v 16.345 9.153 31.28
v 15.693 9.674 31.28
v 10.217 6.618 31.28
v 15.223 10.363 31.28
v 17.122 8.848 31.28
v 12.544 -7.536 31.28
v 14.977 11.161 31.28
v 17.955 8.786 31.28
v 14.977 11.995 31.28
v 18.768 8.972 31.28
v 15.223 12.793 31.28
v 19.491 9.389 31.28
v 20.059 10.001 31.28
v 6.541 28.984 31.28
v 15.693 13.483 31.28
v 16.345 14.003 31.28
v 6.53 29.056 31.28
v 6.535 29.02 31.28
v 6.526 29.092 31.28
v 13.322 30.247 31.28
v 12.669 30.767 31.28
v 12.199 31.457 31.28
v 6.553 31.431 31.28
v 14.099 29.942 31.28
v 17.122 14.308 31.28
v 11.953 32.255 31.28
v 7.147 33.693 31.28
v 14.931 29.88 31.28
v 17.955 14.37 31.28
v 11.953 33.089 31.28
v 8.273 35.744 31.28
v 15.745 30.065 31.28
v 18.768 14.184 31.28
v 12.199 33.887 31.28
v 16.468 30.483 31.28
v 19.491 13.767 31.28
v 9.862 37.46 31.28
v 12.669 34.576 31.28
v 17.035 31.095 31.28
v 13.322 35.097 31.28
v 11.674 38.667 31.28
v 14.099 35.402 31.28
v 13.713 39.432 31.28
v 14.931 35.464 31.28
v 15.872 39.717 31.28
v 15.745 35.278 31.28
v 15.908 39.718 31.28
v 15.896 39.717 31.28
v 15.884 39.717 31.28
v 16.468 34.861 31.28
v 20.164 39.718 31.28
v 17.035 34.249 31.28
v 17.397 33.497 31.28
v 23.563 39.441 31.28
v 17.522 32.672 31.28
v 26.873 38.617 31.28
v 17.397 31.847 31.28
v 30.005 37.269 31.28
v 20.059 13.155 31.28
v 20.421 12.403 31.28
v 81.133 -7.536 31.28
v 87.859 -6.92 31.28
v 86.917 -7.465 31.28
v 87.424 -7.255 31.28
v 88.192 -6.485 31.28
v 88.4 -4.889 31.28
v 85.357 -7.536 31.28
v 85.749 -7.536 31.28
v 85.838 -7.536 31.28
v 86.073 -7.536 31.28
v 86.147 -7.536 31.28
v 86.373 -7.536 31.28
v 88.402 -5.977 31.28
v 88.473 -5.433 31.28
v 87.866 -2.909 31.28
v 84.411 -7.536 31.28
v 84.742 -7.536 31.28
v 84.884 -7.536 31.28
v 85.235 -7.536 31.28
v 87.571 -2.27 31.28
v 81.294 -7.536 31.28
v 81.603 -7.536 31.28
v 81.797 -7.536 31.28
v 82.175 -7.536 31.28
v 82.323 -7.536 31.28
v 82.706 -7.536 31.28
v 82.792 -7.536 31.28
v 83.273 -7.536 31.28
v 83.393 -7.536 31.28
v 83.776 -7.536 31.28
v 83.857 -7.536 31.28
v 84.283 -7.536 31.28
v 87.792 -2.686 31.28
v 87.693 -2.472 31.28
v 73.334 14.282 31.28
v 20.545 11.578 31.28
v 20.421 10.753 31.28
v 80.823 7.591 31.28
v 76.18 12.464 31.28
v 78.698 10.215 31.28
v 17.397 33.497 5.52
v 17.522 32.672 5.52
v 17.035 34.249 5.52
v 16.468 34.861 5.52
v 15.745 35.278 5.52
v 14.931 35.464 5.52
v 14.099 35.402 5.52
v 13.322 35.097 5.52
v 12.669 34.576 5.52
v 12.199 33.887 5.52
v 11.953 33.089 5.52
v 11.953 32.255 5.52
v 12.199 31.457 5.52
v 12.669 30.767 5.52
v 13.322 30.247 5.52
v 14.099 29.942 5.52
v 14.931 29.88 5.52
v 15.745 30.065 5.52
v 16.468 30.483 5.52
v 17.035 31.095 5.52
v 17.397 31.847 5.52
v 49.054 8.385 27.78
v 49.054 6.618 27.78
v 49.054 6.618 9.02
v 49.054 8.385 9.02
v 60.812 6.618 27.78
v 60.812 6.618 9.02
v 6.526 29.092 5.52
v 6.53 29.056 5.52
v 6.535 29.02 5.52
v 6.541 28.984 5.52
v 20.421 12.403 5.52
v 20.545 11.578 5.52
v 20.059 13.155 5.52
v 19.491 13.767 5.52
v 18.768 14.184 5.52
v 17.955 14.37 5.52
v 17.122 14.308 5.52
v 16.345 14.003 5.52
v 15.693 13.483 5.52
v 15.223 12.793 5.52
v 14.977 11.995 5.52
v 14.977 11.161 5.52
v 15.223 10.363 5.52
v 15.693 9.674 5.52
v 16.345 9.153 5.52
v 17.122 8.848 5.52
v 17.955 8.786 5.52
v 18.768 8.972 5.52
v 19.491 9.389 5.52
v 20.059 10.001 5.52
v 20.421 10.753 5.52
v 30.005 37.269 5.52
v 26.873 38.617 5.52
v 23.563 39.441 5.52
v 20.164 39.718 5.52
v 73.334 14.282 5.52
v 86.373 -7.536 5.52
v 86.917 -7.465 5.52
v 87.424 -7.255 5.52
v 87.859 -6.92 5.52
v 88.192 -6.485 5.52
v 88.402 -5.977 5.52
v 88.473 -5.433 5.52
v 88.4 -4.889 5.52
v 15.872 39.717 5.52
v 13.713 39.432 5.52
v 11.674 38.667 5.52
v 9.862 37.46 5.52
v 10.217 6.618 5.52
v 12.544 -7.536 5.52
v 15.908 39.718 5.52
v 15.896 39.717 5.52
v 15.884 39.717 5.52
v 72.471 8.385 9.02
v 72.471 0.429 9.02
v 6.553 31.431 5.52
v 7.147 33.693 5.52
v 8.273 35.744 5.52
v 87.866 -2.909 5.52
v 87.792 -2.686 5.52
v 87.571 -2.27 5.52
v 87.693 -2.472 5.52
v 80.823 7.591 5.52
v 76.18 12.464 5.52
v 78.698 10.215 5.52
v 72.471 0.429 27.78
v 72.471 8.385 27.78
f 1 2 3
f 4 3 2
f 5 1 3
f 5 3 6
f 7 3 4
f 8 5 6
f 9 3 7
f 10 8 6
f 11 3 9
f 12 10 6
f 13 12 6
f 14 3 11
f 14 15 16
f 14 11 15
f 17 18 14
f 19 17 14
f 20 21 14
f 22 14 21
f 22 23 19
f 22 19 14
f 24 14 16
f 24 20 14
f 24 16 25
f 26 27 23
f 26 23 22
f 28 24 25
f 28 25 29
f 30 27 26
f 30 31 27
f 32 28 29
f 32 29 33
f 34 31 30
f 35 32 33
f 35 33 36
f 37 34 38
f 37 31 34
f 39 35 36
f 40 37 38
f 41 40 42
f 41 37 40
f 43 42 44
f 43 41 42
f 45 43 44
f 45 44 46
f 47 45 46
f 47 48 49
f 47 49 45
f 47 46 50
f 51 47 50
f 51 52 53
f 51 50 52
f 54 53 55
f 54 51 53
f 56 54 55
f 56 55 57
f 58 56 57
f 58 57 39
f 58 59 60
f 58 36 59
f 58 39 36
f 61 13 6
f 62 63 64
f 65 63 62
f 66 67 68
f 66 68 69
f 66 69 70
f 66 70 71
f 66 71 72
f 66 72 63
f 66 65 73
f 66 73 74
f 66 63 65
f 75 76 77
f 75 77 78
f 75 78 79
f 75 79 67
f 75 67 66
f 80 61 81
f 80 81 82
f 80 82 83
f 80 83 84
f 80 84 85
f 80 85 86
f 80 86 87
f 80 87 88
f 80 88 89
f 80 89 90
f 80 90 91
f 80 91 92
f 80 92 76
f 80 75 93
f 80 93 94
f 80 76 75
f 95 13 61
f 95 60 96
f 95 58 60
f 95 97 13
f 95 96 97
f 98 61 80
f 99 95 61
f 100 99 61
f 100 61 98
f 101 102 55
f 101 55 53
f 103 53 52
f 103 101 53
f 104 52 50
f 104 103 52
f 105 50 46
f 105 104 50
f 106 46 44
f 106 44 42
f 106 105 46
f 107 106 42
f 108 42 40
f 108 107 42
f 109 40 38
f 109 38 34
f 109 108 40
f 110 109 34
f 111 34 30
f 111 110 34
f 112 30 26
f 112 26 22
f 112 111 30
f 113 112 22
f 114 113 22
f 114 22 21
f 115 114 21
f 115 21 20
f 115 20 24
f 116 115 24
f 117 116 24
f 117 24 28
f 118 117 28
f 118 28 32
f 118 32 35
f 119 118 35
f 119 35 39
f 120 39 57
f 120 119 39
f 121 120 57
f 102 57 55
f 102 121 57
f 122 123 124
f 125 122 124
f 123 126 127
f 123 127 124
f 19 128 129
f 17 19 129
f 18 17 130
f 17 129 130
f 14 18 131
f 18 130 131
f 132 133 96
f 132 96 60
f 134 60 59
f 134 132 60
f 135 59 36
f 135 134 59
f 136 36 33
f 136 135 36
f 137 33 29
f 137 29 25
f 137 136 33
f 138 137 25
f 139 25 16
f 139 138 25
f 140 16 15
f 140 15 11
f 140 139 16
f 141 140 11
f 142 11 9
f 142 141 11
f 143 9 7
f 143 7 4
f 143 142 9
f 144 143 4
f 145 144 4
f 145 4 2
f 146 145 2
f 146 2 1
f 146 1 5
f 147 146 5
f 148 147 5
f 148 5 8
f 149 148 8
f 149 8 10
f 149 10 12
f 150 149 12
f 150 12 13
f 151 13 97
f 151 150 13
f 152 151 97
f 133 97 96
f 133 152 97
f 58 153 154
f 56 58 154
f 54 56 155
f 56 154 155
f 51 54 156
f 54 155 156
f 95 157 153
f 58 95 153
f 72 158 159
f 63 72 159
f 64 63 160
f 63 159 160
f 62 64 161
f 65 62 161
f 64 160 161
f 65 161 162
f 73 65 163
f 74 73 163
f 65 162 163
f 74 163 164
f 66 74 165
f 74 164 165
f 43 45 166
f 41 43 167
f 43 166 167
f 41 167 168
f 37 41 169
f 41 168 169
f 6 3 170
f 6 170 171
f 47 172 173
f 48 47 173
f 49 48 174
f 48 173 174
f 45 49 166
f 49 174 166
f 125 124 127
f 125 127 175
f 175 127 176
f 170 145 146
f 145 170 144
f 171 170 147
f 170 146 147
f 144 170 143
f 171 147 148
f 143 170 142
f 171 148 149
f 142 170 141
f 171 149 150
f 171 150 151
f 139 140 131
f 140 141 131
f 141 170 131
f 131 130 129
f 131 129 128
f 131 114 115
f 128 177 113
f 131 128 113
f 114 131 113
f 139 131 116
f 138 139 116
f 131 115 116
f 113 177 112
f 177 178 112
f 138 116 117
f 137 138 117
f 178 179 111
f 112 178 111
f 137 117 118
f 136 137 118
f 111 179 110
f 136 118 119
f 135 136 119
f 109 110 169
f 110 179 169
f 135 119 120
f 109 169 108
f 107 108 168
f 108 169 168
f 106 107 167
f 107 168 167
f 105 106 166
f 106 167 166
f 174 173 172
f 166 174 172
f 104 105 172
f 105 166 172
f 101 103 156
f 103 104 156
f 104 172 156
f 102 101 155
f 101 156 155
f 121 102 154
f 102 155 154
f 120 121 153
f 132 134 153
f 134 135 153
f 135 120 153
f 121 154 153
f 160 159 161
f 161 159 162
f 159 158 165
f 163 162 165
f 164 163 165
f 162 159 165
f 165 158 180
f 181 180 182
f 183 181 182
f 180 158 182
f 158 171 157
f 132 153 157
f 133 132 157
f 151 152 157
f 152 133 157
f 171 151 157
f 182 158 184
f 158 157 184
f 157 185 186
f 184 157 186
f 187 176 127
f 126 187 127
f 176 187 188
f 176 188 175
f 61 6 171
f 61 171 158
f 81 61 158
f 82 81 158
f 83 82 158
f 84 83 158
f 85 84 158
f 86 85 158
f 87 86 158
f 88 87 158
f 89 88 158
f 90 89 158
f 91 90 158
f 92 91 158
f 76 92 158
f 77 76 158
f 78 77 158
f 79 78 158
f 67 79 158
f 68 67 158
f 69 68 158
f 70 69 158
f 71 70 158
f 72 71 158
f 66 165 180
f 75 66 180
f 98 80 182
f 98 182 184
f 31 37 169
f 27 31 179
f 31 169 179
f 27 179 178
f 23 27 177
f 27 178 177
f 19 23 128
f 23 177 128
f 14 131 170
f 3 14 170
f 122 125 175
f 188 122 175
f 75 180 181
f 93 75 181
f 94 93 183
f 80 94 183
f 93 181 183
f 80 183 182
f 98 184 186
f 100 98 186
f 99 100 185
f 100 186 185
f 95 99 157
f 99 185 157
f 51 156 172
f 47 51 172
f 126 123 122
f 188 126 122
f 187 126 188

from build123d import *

# Parameters (mm, degrees)
SKETCH1_R           = 4
SKETCH1_W           = 0.443674292
SKETCH1_H           = 0.606573965
SKETCH1_W_2         = 0.441272096
SKETCH1_W_3         = 0.539332563
SKETCH1_W_4         = 0.547504268
SKETCH1_W_5         = 0.686423262
SKETCH1_W_6         = 0.547504269
SKETCH1_W_7         = 0.607984695
SKETCH1_W_8         = 0.472854348
SKETCH1_W_9         = 0.501804613
SKETCH1_W_10        = 0.559705146
SKETCH1_W_11        = 0.321886919
SKETCH1_W_12        = 0.335329484
BOSS_EXTRUDE1_DEPTH = 36.8
SKETCH2_W           = 33.453118401
SKETCH2_H           = 26.8
CUT_EXTRUDE1_DEPTH  = 45
SCALE1_SCALE        = 0.7
BOSS_EXTRUDE2_DEPTH = 25.76


with BuildPart() as part:
    # Sketch1 → Boss-Extrude1 (new body)
    # profile 1 of 15: a face of its own
    with BuildSketch(Plane.XY):
        with BuildLine():
            ThreePointArc((-2.487228681, 2.47588145), (-1.643417841, 0.836304882), (0, 0))
            Line((0, 0), (42.98, -6.863043607))
            ThreePointArc((42.98, -6.863043607), (45.517837276, -6.94186018), (47.993719609, -6.378977628))
            ThreePointArc((47.993719609, -6.378977628), (70.945368499, -4.618817082), (91.44683801, -15.086199743))
            ThreePointArc((91.44683801, -15.086199743), (93.970071754, -16.788756754), (96.888617808, -17.653336321))
            Line((96.888617808, -17.653336321), (96.888617808, -17.138033163))
            Line((96.888617808, -17.138033163), (97.372163904, -17.138033163))
            Line((97.372163904, -17.138033163), (97.653484824, -17.138033163))
            Line((97.653484824, -17.138033163), (98.160101984, -17.138033163))
            Line((98.160101984, -17.138033163), (98.378364418, -17.138033163))
            Line((98.378364418, -17.138033163), (98.82203871, -17.138033163))
            Line((98.82203871, -17.138033163), (99.050846464, -17.138033163))
            Line((99.050846464, -17.138033163), (99.49211856, -17.138033163))
            Line((99.49211856, -17.138033163), (99.769956547, -17.138033163))
            Line((99.769956547, -17.138033163), (100.30928911, -17.138033163))
            Line((100.30928911, -17.138033163), (100.521753453, -17.138033163))
            Line((100.521753453, -17.138033163), (101.069257721, -17.138033163))
            Line((101.069257721, -17.138033163), (101.191833303, -17.138033163))
            Line((101.191833303, -17.138033163), (101.878256565, -17.138033163))
            Line((101.878256565, -17.138033163), (102.04986238, -17.138033163))
            Line((102.04986238, -17.138033163), (102.597366649, -17.138033163))
            Line((102.597366649, -17.138033163), (102.713161539, -17.138033163))
            Line((102.713161539, -17.138033163), (103.321146234, -17.138033163))
            Line((103.321146234, -17.138033163), (103.504651325, -17.138033163))
            Line((103.504651325, -17.138033163), (103.977505673, -17.138033163))
            Line((103.977505673, -17.138033163), (104.180157536, -17.138033163))
            Line((104.180157536, -17.138033163), (104.681962149, -17.138033163))
            Line((104.681962149, -17.138033163), (104.855663746, -17.138033163))
            Line((104.855663746, -17.138033163), (105.415368892, -17.138033163))
            Line((105.415368892, -17.138033163), (105.543243667, -17.138033163))
            Line((105.543243667, -17.138033163), (105.878573151, -17.138033163))
            Line((105.878573151, -17.138033163), (105.984724127, -17.138033163))
            Line((105.984724127, -17.138033163), (106.306611046, -17.138033163))
            Line((106.306611046, -17.138033163), (106.306611046, -17.744607128))
            ThreePointArc((106.306611046, -17.744607128), (108.688292645, -16.568776189), (109.203004303, -13.963002303))
            Line((109.203004303, -13.963002303), (108.439636924, -11.134191555))
            ThreePointArc((108.439636924, -11.134191555), (108.267803288, -10.660099415), (108.018988687, -10.221486316))
            Line((108.018988687, -10.221486316), (98.378364418, 3.865502848))
            ThreePointArc((98.378364418, 3.865502848), (93.609207326, 9.293547423), (87.68053985, 13.423853614))
            Line((87.68053985, 13.423853614), (25.781983162, 46.262452549))
            ThreePointArc((25.781983162, 46.262452549), (18.966543391, 48.873228311), (11.72235753, 49.761001134))
            Line((11.72235753, 49.761001134), (5.64235753, 49.761001134))
            ThreePointArc((5.64235753, 49.761001134), (5.616565931, 49.760890264), (5.590776238, 49.760557663))
            ThreePointArc((5.590776238, 49.760557663), (1.019670875, 48.889839007), (-2.994529703, 46.536256857))
            ThreePointArc((-2.994529703, 46.536256857), (-6.872179638, 41.155169878), (-7.760495561, 34.582258733))
            ThreePointArc((-7.760495561, 34.582258733), (-7.750828994, 34.504551611), (-7.739137581, 34.427123255))
            Line((-7.739137581, 34.427123255), (-2.487228681, 2.47588145))
        make_face()
        with Locations((8.267526818, 9.561727541)):
            Circle(SKETCH1_R, mode=Mode.SUBTRACT)
        with Locations((3.948380067, 39.69588145)):
            Circle(SKETCH1_R, mode=Mode.SUBTRACT)
    # profile 2 of 15: a face of its own
    with BuildSketch(Plane.XY):
        with BuildLine():
            Line((96.888617808, -17.138033163), (96.888617808, -17.653336321))
            ThreePointArc((96.888617808, -17.653336321), (97.130063387, -17.683196177), (97.372163904, -17.707173622))
            Line((97.372163904, -17.707173622), (97.372163904, -17.138033163))
            Line((97.372163904, -17.138033163), (96.888617808, -17.138033163))
        make_face()
    # profile 3 of 15: a face of its own
    with BuildSketch(Plane.XY):
        with BuildLine():
            Line((97.653484824, -17.138033163), (97.653484824, -17.727590841))
            ThreePointArc((97.653484824, -17.727590841), (97.906687423, -17.739163166), (98.160101984, -17.744314442))
            Line((98.160101984, -17.744314442), (98.160101984, -17.138033163))
            Line((98.160101984, -17.138033163), (97.653484824, -17.138033163))
        make_face()
    # profile 4 of 15: a face of its own
    with BuildSketch(Plane.XY):
        with Locations((98.600201564, -17.441320146)):
            Rectangle(SKETCH1_W, SKETCH1_H)
    # profile 5 of 15: a face of its own
    with BuildSketch(Plane.XY):
        with Locations((99.271482512, -17.441320146)):
            Rectangle(SKETCH1_W_2, SKETCH1_H)
    # profile 6 of 15: a face of its own
    with BuildSketch(Plane.XY):
        with Locations((100.039622829, -17.441320146)):
            Rectangle(SKETCH1_W_3, SKETCH1_H)
    # profile 7 of 15: a face of its own
    with BuildSketch(Plane.XY):
        with Locations((100.795505587, -17.441320146)):
            Rectangle(SKETCH1_W_4, SKETCH1_H)
    # profile 8 of 15: a face of its own
    with BuildSketch(Plane.XY):
        with Locations((101.535044934, -17.441320146)):
            Rectangle(SKETCH1_W_5, SKETCH1_H)
    # profile 9 of 15: a face of its own
    with BuildSketch(Plane.XY):
        with Locations((102.323614515, -17.441320146)):
            Rectangle(SKETCH1_W_6, SKETCH1_H)
    # profile 10 of 15: a face of its own
    with BuildSketch(Plane.XY):
        with Locations((103.017153887, -17.441320146)):
            Rectangle(SKETCH1_W_7, SKETCH1_H)
    # profile 11 of 15: a face of its own
    with BuildSketch(Plane.XY):
        with Locations((103.741078499, -17.441320146)):
            Rectangle(SKETCH1_W_8, SKETCH1_H)
    # profile 12 of 15: a face of its own
    with BuildSketch(Plane.XY):
        with Locations((104.431059843, -17.441320146)):
            Rectangle(SKETCH1_W_9, SKETCH1_H)
    # profile 13 of 15: a face of its own
    with BuildSketch(Plane.XY):
        with Locations((105.135516319, -17.441320146)):
            Rectangle(SKETCH1_W_10, SKETCH1_H)
    # profile 14 of 15: a face of its own
    with BuildSketch(Plane.XY):
        with Locations((106.145667586, -17.441320146)):
            Rectangle(SKETCH1_W_11, SKETCH1_H)
    # profile 15 of 15: a face of its own
    with BuildSketch(Plane.XY):
        with Locations((105.710908409, -17.441320146)):
            Rectangle(SKETCH1_W_12, SKETCH1_H)
    extrude(amount=BOSS_EXTRUDE1_DEPTH)

    # Sketch2 → Cut-Extrude1 (cut)
    with BuildSketch(Plane(origin=(0, -40, 0), x_dir=(1, 0, 0), z_dir=(0, 1, 0))):
        with Locations((69.72027881, -18.4)):
            Rectangle(SKETCH2_W, SKETCH2_H)
    extrude(amount=CUT_EXTRUDE1_DEPTH, mode=Mode.SUBTRACT)


with BuildPart() as part_1:
    # Scale1: scaled about (39.860062577, 16.282698439, 18.4)
    add(part.part.scale(SCALE1_SCALE).moved(Location((11.958018773, 4.884809532, 5.52))))

    # Sketch3 → Boss-Extrude2 (add)
    with BuildSketch(Plane.XY.offset(31.28)):
        Polygon((10.216958697, 6.617926547), (12.543544787, -7.536415458), (86.372646506, -7.536415458), (86.372646506, -6.950234368), (60.81181541, 6.617926547), align=None)
    extrude(amount=-BOSS_EXTRUDE2_DEPTH)


solid = part_1.part
